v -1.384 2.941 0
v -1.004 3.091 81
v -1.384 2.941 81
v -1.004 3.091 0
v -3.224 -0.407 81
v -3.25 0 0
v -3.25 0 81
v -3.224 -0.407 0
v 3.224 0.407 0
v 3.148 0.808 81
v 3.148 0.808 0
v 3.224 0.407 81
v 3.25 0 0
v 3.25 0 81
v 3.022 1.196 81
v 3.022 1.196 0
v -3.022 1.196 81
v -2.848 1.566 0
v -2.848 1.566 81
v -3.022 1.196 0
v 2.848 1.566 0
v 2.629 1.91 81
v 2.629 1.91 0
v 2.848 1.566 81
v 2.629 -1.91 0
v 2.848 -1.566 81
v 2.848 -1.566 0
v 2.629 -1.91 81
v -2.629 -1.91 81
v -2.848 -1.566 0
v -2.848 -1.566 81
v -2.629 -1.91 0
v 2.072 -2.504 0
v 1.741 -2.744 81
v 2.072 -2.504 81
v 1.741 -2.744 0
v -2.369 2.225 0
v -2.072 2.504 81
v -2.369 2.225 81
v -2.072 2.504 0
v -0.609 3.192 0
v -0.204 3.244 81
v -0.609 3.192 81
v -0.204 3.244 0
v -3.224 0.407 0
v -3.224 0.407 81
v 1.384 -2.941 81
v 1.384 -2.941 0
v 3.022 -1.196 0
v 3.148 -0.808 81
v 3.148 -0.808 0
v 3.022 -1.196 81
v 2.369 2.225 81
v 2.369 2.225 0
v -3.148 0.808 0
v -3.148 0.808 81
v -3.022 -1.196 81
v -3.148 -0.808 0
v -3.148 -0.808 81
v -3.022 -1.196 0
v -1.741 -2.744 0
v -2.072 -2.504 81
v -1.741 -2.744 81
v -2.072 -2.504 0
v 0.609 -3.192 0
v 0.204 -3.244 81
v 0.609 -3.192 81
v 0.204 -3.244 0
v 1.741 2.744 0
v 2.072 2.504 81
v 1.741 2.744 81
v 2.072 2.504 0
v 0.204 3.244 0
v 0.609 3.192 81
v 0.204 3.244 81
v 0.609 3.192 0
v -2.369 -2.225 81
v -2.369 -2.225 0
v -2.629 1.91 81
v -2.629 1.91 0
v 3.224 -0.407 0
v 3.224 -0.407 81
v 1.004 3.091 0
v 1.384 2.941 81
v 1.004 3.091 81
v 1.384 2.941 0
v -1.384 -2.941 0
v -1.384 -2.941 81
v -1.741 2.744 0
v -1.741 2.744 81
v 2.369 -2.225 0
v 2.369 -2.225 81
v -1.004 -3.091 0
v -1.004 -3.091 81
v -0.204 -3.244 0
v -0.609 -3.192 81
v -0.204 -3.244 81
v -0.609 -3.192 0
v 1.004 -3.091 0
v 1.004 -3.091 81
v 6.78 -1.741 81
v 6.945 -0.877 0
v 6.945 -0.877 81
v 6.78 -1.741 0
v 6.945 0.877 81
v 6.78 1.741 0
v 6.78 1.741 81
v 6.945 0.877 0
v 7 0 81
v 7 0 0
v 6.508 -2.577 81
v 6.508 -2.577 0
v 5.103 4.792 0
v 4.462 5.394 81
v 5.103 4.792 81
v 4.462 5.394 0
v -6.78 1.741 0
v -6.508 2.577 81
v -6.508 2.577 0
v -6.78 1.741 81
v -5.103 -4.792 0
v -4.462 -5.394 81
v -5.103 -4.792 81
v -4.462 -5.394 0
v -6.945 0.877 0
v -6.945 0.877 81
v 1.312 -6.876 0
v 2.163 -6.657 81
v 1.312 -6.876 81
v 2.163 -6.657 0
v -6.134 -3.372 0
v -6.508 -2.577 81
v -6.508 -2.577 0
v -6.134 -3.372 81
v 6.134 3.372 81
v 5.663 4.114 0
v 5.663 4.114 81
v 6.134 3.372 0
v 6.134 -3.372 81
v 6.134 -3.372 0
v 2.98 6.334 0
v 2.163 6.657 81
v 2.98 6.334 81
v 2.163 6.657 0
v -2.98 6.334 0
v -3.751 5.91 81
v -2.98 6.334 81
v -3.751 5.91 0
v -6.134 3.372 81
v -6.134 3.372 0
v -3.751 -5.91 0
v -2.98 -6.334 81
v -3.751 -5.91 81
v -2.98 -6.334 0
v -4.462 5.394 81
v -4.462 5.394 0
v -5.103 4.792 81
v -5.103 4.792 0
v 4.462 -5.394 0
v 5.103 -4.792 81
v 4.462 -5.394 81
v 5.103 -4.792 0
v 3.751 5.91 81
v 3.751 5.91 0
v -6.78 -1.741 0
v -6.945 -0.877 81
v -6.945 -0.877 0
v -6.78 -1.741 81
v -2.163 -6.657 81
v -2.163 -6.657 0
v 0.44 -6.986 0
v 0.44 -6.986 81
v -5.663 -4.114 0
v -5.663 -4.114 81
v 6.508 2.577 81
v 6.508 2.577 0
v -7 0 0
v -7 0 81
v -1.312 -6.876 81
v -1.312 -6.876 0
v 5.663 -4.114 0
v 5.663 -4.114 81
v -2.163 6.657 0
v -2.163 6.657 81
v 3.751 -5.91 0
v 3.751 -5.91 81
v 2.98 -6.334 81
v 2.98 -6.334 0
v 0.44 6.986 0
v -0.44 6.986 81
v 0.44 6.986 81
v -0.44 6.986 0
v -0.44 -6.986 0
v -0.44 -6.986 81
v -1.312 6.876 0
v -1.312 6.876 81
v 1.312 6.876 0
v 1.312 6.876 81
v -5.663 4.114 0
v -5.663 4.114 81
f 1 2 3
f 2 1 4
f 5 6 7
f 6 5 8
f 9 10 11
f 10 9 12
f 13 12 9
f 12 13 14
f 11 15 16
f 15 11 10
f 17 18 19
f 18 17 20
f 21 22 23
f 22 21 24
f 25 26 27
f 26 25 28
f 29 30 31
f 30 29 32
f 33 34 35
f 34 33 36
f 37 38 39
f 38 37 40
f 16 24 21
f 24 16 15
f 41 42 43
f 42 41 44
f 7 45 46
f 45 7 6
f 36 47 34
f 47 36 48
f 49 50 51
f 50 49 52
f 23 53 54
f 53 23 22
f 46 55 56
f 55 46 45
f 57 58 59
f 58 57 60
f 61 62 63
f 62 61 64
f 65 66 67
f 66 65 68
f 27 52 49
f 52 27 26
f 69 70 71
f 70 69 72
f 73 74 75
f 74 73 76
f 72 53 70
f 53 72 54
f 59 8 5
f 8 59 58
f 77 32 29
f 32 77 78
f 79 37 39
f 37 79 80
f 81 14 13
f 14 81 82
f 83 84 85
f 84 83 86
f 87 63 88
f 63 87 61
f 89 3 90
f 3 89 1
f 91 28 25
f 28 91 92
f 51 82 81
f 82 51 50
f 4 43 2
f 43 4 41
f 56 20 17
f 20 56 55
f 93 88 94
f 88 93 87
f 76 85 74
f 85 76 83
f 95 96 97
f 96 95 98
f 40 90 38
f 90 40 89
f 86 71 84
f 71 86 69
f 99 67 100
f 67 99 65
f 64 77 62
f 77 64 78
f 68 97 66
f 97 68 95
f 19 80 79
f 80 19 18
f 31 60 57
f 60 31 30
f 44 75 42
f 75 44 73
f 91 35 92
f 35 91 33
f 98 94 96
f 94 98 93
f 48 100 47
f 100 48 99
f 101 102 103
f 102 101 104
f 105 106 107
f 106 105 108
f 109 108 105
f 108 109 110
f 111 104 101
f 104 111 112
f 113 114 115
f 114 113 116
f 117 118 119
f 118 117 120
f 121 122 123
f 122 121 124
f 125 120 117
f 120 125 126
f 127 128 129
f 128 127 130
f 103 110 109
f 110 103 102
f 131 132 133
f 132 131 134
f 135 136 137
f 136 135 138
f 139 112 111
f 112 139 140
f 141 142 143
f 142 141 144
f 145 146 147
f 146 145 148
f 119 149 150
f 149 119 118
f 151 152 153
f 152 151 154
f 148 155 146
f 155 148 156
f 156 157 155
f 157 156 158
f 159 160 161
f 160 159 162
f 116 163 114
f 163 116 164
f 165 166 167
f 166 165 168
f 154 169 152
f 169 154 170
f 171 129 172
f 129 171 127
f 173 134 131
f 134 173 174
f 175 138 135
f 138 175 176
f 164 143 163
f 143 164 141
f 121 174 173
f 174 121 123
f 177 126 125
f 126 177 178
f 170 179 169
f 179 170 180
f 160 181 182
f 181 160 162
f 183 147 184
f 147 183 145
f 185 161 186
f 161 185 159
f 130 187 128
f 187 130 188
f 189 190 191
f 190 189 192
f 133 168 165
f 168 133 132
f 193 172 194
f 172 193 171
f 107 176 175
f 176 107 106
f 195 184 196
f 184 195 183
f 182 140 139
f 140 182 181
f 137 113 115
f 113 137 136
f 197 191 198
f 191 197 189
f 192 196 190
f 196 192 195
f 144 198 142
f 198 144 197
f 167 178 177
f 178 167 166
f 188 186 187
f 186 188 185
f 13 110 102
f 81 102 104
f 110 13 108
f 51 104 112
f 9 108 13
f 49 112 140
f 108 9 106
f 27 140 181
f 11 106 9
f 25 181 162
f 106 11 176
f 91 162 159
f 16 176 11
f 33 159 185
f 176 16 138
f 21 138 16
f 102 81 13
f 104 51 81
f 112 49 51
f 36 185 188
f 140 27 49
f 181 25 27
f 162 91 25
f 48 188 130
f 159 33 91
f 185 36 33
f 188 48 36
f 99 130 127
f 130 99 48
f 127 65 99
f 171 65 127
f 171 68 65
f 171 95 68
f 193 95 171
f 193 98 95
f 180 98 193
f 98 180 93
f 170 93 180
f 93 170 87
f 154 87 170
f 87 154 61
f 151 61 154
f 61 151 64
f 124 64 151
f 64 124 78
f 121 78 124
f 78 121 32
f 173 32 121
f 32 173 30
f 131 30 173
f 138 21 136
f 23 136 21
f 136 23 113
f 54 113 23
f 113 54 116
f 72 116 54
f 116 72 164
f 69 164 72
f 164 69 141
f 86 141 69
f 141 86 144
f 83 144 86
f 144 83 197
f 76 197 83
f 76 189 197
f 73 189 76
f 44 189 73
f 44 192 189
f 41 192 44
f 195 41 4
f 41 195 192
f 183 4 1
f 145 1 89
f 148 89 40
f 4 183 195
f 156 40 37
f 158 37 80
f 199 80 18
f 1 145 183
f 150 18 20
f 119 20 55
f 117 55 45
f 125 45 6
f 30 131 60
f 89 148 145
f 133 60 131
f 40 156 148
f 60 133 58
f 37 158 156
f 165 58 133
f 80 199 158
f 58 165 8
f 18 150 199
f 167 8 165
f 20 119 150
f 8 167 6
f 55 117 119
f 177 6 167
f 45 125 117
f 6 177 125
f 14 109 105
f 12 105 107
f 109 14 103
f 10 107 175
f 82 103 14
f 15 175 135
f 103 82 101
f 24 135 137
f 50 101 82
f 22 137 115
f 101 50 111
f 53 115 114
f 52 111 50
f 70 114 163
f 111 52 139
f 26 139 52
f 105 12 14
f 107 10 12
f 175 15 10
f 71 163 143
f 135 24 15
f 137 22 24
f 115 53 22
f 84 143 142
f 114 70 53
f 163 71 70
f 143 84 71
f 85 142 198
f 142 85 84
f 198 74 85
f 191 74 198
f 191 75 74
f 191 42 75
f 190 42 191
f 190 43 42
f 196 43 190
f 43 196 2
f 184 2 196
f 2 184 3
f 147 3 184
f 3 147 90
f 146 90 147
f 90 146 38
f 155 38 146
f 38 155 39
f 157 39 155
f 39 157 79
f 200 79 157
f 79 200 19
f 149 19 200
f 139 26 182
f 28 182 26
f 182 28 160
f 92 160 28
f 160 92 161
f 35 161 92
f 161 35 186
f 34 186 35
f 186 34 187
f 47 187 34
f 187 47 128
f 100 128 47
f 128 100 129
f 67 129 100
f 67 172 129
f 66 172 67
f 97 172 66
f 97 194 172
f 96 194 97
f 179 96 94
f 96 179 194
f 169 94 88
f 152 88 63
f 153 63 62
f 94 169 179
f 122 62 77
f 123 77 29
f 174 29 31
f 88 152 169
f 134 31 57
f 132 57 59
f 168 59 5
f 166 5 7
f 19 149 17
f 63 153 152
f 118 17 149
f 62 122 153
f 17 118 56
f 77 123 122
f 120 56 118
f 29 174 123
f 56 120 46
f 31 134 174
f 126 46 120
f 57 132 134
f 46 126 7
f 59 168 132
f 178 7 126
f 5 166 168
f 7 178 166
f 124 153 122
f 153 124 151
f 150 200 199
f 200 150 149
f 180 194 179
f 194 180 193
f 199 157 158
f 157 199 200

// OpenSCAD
$fn = 50;


difference() {
	union() {
		*color(alpha = 1.0000000000, c = "gray") {
			translate(v = [0, 7, 0]) {
				linear_extrude(height = 1) {
					text(font = "Arial:style=Bold", halign = "center", size = 4.5000000000, text = "COMMENT plate main", valign = "center");
				}
			}
		}
		cylinder(h = 81, r = 7.0000000000);
	}
	union() {
		*color(alpha = 1.0000000000, c = "gray") {
			translate(v = [0, 7, 0]) {
				linear_extrude(height = 1) {
					text(font = "Arial:style=Bold", halign = "center", size = 4.5000000000, text = "COMMENT holes main", valign = "center");
				}
			}
		}
		translate(v = [0, 0, -100]) {
			cylinder(h = 200, r = 3.2500000000);
		}
		translate(v = [0, 0, -100]) {
			cylinder(h = 200, r = 1.8000000000);
		}
	}
}
